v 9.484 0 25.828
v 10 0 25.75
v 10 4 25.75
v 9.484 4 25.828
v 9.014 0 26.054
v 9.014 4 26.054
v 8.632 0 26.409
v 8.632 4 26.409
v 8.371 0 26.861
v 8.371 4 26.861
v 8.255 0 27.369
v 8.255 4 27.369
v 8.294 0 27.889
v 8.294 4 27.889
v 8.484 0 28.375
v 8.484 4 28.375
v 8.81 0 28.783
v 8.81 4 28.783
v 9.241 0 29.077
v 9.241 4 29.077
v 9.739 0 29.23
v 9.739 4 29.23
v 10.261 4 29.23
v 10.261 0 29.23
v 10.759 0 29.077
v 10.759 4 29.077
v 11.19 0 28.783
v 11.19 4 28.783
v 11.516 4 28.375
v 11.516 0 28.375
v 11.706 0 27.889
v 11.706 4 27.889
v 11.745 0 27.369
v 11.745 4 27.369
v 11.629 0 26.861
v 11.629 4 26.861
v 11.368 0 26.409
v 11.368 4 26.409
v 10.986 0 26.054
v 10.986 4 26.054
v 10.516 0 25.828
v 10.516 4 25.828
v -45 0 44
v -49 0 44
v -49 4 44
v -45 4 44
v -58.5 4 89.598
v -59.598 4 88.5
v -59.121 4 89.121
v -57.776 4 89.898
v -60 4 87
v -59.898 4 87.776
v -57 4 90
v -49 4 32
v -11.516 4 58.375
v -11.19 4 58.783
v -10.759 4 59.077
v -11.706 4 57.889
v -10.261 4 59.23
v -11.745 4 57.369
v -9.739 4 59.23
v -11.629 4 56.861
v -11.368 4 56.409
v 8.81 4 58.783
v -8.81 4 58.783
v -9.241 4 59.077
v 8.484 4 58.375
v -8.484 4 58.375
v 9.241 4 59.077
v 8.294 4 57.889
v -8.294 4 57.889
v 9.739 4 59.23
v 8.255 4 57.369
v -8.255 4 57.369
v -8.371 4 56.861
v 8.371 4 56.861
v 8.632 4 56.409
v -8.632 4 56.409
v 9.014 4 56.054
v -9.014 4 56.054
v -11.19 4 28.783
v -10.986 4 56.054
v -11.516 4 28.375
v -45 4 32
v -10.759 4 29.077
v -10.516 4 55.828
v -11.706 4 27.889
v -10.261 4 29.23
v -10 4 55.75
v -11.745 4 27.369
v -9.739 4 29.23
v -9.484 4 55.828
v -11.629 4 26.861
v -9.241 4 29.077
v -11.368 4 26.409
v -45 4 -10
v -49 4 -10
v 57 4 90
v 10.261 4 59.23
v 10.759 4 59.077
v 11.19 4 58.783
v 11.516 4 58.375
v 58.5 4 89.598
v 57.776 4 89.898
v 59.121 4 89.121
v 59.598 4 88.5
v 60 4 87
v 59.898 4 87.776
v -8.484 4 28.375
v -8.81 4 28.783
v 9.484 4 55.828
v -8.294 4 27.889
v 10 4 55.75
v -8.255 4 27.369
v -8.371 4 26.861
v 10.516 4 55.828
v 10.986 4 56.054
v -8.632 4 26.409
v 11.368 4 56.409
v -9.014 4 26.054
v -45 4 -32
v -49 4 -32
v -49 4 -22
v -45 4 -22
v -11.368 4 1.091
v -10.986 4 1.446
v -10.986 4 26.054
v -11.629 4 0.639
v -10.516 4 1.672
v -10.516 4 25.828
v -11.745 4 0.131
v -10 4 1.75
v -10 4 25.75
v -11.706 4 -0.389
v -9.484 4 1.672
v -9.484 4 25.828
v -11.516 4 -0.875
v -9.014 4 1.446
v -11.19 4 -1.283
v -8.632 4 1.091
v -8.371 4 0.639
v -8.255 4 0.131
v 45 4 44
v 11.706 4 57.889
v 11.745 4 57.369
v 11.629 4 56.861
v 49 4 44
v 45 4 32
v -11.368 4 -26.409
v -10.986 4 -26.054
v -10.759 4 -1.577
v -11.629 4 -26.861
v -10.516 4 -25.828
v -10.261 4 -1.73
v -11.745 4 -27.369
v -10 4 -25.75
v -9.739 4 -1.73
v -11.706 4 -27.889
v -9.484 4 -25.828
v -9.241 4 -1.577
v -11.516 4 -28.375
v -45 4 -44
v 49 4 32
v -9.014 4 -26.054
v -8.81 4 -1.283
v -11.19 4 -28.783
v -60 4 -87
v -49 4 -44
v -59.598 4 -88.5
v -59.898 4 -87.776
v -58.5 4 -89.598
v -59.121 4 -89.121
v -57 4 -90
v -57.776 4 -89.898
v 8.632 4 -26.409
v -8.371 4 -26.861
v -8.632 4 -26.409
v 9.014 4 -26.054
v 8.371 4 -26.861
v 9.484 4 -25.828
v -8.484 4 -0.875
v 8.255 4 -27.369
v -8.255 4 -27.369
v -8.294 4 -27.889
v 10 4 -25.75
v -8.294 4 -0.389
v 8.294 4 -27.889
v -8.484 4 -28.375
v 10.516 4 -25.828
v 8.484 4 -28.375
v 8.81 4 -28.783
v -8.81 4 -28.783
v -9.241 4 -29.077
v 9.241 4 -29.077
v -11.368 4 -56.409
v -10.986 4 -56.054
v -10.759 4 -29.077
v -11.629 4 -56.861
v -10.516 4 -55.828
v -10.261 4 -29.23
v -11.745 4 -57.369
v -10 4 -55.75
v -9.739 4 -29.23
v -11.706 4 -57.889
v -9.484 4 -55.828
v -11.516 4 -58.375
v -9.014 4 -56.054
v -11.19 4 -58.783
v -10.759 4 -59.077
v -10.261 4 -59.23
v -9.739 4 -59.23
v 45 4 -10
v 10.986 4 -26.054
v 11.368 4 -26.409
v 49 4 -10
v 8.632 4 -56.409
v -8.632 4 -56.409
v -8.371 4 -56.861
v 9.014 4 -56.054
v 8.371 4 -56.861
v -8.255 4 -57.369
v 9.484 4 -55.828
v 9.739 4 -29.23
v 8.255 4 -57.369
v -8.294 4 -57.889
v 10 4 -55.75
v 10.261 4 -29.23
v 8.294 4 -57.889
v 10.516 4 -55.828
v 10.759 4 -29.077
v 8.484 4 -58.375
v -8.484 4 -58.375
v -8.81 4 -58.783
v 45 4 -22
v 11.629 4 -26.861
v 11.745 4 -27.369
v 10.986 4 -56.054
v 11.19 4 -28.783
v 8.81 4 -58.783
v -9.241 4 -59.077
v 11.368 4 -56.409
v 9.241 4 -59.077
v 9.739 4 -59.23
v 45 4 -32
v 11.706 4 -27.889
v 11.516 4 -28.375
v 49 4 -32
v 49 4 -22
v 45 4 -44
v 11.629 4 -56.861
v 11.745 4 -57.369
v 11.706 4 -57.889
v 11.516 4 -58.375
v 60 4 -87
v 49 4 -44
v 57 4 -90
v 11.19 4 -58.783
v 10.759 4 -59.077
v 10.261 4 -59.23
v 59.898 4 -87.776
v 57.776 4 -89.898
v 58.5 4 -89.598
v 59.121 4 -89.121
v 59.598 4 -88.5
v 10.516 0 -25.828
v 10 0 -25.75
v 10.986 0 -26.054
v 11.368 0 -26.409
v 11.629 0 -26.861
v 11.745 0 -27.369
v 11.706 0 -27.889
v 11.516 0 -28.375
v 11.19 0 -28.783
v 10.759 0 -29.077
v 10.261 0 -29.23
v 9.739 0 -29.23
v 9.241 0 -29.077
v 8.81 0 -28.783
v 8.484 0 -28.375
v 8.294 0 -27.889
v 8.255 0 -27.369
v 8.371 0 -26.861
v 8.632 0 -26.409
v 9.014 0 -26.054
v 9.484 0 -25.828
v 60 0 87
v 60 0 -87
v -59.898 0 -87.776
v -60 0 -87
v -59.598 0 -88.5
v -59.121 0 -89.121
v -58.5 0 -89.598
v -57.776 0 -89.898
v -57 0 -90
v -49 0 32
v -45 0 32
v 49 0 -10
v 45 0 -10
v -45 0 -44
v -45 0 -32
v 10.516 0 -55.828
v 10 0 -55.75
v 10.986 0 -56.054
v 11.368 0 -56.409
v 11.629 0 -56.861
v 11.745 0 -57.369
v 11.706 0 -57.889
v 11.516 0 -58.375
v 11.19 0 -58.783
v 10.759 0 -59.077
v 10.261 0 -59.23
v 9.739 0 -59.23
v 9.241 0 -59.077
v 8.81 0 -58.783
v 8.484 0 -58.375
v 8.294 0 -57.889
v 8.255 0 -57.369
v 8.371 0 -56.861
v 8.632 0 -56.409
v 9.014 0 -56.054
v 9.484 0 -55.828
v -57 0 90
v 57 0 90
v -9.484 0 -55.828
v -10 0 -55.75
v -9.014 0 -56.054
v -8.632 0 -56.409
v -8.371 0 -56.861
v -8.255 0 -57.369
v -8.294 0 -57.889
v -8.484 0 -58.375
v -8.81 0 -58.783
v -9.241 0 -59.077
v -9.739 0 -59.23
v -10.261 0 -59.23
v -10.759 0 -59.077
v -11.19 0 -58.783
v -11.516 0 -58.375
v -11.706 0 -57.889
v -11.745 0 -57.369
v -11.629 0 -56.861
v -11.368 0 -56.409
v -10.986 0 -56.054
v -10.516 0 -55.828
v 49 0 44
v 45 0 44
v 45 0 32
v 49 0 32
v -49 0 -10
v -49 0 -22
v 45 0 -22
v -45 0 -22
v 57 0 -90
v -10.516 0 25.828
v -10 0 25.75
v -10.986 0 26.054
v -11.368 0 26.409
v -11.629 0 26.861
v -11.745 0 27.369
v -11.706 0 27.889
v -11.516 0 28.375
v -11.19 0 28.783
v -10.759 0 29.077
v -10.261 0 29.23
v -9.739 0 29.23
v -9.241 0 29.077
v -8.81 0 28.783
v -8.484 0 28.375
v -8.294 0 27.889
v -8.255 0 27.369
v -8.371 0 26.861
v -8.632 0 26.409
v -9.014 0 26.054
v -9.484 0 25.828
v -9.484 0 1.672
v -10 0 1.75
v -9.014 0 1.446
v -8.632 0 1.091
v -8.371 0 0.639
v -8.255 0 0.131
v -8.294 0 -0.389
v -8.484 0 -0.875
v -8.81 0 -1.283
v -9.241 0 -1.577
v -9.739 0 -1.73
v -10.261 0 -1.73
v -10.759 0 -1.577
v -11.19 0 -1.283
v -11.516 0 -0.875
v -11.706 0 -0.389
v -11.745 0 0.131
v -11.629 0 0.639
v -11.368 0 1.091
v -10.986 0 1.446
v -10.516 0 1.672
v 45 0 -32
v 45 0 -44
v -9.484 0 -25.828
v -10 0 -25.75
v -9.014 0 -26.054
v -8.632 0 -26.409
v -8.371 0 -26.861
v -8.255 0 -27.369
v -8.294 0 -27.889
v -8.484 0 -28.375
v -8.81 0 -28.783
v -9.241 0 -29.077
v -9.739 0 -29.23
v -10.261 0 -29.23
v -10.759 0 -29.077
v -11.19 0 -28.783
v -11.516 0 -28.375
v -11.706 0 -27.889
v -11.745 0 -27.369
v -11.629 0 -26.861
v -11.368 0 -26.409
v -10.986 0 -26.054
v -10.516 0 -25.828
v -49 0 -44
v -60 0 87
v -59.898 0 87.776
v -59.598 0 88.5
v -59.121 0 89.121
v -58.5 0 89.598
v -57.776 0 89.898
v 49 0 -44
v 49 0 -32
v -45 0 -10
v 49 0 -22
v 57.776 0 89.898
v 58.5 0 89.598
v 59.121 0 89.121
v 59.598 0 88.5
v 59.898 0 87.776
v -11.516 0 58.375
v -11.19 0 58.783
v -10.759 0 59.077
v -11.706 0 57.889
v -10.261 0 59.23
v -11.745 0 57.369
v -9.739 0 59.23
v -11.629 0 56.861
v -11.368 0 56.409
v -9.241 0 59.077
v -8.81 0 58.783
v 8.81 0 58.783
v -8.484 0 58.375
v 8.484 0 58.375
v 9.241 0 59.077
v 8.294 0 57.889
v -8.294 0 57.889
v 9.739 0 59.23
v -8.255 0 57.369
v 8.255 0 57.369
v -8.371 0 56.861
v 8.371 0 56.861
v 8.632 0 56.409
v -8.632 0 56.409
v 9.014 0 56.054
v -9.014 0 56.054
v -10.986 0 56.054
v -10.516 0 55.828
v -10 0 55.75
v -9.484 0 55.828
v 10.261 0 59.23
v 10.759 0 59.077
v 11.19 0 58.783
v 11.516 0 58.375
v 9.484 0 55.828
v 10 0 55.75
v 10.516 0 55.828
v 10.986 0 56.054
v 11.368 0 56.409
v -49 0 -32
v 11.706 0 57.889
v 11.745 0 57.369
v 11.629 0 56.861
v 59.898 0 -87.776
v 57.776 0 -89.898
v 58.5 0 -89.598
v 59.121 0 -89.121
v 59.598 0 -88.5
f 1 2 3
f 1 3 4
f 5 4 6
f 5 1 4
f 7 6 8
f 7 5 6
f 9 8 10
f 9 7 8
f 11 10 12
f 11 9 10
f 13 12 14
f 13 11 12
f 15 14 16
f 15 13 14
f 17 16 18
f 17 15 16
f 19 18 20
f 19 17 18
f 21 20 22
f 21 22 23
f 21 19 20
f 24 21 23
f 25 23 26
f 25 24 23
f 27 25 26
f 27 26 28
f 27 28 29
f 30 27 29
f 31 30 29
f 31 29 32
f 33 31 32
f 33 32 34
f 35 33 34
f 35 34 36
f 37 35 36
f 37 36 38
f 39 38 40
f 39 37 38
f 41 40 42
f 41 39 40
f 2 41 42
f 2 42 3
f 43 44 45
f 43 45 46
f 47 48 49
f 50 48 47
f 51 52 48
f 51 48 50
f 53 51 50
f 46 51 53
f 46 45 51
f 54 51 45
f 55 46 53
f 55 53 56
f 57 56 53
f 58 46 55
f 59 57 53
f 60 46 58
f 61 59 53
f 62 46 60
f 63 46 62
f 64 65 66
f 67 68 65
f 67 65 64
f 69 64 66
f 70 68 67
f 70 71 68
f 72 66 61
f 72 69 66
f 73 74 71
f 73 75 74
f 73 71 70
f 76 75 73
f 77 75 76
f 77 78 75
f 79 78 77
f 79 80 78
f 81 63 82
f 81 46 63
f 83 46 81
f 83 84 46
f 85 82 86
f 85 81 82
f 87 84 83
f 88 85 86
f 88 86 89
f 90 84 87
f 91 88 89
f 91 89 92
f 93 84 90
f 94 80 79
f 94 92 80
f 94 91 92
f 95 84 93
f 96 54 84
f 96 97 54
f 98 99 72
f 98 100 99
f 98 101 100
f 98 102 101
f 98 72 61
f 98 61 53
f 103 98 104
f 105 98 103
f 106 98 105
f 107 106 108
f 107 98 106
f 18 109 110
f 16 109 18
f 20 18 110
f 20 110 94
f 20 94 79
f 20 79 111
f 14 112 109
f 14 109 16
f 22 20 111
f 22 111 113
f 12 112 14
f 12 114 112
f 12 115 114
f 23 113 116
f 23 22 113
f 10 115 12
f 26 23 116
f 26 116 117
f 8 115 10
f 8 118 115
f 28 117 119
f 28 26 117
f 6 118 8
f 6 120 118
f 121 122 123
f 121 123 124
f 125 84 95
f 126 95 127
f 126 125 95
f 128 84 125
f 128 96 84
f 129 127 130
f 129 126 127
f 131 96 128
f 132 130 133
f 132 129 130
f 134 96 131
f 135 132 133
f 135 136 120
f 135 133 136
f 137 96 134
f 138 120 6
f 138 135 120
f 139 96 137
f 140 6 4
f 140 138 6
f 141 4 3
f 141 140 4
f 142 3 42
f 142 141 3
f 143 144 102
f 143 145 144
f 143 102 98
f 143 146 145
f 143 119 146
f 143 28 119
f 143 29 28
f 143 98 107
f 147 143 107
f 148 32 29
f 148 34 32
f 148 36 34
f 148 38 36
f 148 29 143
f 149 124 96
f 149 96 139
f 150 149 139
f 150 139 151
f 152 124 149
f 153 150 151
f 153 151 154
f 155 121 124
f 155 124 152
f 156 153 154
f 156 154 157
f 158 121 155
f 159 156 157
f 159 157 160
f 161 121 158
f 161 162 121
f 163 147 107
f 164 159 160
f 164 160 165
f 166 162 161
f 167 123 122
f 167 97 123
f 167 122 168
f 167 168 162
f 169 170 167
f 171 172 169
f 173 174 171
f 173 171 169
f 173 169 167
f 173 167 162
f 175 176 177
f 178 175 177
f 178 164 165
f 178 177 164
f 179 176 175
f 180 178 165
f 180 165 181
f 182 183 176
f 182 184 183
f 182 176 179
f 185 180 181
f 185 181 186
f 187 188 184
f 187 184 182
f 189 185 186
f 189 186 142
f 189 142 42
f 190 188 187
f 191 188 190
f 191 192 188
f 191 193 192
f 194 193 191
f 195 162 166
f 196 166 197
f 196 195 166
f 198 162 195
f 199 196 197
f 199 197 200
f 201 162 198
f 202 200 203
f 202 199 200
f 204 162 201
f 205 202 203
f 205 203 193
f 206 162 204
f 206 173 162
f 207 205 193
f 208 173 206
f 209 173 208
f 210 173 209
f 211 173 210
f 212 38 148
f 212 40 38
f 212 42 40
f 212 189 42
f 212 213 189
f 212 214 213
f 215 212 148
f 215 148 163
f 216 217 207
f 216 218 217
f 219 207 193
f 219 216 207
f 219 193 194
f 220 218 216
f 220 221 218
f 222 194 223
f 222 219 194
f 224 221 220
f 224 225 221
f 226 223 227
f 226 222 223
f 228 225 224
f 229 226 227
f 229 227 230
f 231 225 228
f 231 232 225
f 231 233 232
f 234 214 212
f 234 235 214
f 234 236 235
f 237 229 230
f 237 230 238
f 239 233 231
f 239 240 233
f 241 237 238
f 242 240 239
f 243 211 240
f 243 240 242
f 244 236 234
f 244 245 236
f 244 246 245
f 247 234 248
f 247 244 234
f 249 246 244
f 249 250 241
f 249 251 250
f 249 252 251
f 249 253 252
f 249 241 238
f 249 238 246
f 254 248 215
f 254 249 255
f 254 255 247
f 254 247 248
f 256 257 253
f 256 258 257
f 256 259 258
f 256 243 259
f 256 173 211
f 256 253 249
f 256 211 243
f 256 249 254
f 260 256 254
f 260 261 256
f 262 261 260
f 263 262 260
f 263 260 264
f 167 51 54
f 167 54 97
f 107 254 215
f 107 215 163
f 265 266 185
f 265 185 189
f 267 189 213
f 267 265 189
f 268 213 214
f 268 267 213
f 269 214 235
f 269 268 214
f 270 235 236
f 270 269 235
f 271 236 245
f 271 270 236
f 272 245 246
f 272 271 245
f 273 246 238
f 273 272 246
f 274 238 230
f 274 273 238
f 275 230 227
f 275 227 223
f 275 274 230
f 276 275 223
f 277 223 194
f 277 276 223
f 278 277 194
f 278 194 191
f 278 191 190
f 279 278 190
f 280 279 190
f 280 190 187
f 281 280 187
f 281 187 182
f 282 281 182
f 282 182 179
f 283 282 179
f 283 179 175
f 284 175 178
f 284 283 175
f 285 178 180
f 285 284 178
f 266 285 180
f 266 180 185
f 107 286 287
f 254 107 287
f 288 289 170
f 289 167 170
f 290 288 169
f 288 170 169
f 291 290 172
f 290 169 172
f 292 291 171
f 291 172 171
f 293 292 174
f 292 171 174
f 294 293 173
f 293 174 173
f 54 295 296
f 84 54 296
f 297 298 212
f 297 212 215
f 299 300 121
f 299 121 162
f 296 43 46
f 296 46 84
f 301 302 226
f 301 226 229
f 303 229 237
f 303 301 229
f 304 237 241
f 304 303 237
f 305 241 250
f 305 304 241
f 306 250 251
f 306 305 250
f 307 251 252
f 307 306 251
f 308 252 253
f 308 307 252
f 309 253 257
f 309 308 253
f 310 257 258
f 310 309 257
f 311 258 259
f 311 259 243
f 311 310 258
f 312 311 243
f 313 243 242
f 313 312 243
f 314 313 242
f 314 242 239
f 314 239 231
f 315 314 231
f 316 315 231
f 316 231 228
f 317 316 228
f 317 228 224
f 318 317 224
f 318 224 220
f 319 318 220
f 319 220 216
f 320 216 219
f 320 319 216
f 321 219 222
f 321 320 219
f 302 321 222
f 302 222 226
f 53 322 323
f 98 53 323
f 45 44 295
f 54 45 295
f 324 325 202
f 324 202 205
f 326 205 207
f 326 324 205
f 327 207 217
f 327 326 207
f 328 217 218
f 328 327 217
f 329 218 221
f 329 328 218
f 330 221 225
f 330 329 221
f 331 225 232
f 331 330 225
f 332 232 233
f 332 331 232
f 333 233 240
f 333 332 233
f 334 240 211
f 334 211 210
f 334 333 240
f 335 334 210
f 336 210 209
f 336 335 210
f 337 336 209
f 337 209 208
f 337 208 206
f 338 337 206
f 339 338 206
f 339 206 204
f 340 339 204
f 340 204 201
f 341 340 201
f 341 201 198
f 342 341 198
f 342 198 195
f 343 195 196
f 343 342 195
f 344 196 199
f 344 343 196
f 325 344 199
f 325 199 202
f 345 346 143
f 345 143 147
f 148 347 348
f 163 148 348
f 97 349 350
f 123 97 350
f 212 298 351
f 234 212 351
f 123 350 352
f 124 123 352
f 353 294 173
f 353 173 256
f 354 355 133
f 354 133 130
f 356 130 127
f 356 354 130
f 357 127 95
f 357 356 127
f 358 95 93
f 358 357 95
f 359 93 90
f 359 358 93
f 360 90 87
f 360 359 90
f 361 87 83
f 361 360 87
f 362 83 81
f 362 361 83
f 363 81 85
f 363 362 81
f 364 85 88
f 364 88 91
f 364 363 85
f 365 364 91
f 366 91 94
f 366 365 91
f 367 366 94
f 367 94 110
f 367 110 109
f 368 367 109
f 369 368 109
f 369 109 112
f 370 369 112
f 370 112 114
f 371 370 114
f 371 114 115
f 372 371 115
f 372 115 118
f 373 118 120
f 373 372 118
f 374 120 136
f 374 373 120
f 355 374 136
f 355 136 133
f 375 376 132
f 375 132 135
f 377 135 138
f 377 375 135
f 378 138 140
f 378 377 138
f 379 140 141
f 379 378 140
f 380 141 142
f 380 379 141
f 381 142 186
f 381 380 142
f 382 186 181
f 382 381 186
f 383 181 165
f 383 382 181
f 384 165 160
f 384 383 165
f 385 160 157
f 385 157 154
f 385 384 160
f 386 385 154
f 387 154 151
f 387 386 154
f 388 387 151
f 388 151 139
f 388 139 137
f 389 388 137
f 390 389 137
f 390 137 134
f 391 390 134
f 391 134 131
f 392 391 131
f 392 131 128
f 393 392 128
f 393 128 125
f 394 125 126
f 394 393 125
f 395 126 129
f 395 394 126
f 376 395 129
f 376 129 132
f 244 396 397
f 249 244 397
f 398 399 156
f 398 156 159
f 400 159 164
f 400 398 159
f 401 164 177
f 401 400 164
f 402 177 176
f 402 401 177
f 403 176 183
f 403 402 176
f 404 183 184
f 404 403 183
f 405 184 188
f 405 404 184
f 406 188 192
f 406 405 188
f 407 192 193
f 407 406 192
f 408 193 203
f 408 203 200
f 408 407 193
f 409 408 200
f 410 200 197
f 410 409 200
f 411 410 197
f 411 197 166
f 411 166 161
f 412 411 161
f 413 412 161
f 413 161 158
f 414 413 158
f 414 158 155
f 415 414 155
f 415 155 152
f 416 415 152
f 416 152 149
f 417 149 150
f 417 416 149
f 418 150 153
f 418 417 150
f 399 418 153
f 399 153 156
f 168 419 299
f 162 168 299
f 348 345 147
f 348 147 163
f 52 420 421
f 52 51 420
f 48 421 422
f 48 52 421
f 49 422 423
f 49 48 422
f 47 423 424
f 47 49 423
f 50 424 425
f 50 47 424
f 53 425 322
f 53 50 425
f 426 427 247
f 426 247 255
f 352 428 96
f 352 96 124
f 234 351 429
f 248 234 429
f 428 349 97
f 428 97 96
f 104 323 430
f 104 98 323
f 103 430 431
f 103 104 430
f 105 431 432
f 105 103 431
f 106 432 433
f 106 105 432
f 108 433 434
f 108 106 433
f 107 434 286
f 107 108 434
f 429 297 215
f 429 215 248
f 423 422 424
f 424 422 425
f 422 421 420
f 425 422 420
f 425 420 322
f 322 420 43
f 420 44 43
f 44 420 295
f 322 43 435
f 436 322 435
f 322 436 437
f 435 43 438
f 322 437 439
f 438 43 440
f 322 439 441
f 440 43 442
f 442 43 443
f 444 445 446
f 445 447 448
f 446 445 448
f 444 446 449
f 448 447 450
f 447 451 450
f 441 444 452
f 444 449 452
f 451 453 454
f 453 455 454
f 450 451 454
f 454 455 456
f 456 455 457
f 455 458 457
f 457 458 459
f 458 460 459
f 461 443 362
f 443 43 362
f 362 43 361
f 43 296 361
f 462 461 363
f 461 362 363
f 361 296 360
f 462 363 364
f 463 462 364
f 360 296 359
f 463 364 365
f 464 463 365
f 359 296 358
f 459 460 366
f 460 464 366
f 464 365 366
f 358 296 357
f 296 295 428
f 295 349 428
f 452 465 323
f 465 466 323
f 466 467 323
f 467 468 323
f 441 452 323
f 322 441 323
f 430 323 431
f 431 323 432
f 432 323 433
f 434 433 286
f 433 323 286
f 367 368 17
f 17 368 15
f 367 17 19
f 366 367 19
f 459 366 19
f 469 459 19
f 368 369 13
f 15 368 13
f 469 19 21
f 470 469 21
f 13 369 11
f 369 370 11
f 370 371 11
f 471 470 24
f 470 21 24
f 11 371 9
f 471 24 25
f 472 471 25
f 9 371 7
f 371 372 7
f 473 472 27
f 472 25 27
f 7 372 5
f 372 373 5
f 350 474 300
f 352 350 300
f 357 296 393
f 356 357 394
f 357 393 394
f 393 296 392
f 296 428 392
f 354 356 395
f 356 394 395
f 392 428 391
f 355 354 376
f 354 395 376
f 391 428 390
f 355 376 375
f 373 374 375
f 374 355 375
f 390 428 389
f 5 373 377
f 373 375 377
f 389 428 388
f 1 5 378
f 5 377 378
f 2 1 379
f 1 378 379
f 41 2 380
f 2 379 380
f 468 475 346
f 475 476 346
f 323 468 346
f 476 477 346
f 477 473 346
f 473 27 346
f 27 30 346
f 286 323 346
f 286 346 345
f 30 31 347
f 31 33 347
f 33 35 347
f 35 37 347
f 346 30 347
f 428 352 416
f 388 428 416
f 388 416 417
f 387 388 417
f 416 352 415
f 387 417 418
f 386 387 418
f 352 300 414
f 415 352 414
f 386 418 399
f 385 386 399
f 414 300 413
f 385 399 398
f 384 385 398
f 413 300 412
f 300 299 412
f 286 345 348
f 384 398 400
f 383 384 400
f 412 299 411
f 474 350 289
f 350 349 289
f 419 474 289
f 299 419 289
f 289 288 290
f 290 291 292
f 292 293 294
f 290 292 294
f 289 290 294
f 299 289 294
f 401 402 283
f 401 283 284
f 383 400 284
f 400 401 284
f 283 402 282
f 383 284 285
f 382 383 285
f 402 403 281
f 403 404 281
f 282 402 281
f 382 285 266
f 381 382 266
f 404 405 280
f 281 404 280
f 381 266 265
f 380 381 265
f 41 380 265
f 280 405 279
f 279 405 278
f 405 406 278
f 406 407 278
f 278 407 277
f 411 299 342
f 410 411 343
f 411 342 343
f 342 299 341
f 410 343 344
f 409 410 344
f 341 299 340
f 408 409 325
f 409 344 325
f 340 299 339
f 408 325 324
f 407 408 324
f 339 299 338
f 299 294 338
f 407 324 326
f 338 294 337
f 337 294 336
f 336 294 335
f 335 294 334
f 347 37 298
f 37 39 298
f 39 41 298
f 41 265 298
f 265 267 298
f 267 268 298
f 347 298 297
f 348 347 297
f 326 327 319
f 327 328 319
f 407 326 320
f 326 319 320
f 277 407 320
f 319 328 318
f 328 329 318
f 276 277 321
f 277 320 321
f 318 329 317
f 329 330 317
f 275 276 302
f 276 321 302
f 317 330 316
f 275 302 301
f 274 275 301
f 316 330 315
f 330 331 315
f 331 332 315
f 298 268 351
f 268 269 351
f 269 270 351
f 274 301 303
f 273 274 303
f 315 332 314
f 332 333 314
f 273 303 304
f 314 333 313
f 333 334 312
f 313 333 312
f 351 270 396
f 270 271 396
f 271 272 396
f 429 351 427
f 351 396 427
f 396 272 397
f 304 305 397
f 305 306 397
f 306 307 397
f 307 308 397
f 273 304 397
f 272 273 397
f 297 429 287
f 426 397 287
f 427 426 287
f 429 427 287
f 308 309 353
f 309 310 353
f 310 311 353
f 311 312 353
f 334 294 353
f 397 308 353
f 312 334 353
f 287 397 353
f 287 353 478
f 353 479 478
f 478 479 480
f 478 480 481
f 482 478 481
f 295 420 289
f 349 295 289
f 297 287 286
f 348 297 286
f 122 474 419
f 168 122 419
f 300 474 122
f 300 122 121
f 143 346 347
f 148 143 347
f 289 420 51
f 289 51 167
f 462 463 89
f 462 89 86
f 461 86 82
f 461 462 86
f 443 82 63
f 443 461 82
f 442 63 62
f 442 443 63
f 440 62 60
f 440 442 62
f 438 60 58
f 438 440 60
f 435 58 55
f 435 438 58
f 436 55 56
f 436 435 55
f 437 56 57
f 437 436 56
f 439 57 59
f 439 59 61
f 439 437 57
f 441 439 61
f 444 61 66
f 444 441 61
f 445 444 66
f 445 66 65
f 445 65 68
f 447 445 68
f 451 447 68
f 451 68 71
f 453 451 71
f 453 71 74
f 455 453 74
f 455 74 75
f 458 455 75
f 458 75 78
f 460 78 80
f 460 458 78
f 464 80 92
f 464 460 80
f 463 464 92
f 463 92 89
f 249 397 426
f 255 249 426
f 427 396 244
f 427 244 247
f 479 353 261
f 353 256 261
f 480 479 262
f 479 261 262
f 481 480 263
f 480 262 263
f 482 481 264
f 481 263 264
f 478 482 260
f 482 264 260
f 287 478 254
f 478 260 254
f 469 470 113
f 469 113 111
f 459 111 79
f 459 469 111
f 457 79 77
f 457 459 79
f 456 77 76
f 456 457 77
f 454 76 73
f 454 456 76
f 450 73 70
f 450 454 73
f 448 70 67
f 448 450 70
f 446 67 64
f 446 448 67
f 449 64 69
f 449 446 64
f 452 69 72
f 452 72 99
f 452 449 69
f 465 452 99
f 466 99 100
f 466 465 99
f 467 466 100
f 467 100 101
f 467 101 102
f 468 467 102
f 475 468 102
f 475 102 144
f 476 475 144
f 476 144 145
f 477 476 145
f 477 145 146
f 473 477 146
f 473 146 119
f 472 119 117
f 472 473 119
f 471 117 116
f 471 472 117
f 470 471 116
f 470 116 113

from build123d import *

# Parameters (mm, degrees)
SKETCH1_W           = 120
SKETCH1_H           = 180
SKETCH1_R           = 1.75
SKETCH1_W_2         = 4
SKETCH1_H_2         = 12
BOSS_EXTRUDE1_DEPTH = 4
FILLET1_R           = 3


with BuildPart() as part:
    # Sketch1 → Boss-Extrude1 (new body)
    with BuildSketch(Plane(origin=(0, 0, 0), x_dir=(1, 0, 0), z_dir=(0, 1, 0))):
        Rectangle(SKETCH1_W, SKETCH1_H)
        with Locations(Location((-10, 57.5, 0), (0, 0, 270))):
            Circle(SKETCH1_R, mode=Mode.SUBTRACT)
        with Locations(Location((10, 57.5, 0), (0, 0, 270))):
            Circle(SKETCH1_R, mode=Mode.SUBTRACT)
        with Locations(Location((10, 27.5, 0), (0, 0, 270))):
            Circle(SKETCH1_R, mode=Mode.SUBTRACT)
        with Locations(Location((-10, 27.5, 0), (0, 0, 270))):
            Circle(SKETCH1_R, mode=Mode.SUBTRACT)
        with Locations(Location((10, -27.5, 0), (0, 0, 90))):
            Circle(SKETCH1_R, mode=Mode.SUBTRACT)
        with Locations(Location((-10, -27.5, 0), (0, 0, 90))):
            Circle(SKETCH1_R, mode=Mode.SUBTRACT)
        with Locations(Location((10, -57.5, 0), (0, 0, 90))):
            Circle(SKETCH1_R, mode=Mode.SUBTRACT)
        with Locations(Location((-10, -57.5, 0), (0, 0, 90))):
            Circle(SKETCH1_R, mode=Mode.SUBTRACT)
        with Locations(Location((-10, 0, 0), (0, 0, 270))):
            Circle(SKETCH1_R, mode=Mode.SUBTRACT)
        with Locations((-47, 16)):
            Rectangle(SKETCH1_W_2, SKETCH1_H_2, mode=Mode.SUBTRACT)
        with Locations((-47, 38)):
            Rectangle(SKETCH1_W_2, SKETCH1_H_2, mode=Mode.SUBTRACT)
        with Locations((-47, -38)):
            Rectangle(SKETCH1_W_2, SKETCH1_H_2, mode=Mode.SUBTRACT)
        with Locations((47, -38)):
            Rectangle(SKETCH1_W_2, SKETCH1_H_2, mode=Mode.SUBTRACT)
        with Locations((47, 16)):
            Rectangle(SKETCH1_W_2, SKETCH1_H_2, mode=Mode.SUBTRACT)
        with Locations((47, 38)):
            Rectangle(SKETCH1_W_2, SKETCH1_H_2, mode=Mode.SUBTRACT)
    extrude(amount=BOSS_EXTRUDE1_DEPTH)

    # Fillet1
    fillet1_edges = [part.edges().sort_by_distance(p)[0] for p in [
        (60, 2, 90),
        (-60, 2, 90),
        (-60, 2, -90),
        (60, 2, -90),
    ]]
    fillet(fillet1_edges, radius=FILLET1_R)


solid = part.part
